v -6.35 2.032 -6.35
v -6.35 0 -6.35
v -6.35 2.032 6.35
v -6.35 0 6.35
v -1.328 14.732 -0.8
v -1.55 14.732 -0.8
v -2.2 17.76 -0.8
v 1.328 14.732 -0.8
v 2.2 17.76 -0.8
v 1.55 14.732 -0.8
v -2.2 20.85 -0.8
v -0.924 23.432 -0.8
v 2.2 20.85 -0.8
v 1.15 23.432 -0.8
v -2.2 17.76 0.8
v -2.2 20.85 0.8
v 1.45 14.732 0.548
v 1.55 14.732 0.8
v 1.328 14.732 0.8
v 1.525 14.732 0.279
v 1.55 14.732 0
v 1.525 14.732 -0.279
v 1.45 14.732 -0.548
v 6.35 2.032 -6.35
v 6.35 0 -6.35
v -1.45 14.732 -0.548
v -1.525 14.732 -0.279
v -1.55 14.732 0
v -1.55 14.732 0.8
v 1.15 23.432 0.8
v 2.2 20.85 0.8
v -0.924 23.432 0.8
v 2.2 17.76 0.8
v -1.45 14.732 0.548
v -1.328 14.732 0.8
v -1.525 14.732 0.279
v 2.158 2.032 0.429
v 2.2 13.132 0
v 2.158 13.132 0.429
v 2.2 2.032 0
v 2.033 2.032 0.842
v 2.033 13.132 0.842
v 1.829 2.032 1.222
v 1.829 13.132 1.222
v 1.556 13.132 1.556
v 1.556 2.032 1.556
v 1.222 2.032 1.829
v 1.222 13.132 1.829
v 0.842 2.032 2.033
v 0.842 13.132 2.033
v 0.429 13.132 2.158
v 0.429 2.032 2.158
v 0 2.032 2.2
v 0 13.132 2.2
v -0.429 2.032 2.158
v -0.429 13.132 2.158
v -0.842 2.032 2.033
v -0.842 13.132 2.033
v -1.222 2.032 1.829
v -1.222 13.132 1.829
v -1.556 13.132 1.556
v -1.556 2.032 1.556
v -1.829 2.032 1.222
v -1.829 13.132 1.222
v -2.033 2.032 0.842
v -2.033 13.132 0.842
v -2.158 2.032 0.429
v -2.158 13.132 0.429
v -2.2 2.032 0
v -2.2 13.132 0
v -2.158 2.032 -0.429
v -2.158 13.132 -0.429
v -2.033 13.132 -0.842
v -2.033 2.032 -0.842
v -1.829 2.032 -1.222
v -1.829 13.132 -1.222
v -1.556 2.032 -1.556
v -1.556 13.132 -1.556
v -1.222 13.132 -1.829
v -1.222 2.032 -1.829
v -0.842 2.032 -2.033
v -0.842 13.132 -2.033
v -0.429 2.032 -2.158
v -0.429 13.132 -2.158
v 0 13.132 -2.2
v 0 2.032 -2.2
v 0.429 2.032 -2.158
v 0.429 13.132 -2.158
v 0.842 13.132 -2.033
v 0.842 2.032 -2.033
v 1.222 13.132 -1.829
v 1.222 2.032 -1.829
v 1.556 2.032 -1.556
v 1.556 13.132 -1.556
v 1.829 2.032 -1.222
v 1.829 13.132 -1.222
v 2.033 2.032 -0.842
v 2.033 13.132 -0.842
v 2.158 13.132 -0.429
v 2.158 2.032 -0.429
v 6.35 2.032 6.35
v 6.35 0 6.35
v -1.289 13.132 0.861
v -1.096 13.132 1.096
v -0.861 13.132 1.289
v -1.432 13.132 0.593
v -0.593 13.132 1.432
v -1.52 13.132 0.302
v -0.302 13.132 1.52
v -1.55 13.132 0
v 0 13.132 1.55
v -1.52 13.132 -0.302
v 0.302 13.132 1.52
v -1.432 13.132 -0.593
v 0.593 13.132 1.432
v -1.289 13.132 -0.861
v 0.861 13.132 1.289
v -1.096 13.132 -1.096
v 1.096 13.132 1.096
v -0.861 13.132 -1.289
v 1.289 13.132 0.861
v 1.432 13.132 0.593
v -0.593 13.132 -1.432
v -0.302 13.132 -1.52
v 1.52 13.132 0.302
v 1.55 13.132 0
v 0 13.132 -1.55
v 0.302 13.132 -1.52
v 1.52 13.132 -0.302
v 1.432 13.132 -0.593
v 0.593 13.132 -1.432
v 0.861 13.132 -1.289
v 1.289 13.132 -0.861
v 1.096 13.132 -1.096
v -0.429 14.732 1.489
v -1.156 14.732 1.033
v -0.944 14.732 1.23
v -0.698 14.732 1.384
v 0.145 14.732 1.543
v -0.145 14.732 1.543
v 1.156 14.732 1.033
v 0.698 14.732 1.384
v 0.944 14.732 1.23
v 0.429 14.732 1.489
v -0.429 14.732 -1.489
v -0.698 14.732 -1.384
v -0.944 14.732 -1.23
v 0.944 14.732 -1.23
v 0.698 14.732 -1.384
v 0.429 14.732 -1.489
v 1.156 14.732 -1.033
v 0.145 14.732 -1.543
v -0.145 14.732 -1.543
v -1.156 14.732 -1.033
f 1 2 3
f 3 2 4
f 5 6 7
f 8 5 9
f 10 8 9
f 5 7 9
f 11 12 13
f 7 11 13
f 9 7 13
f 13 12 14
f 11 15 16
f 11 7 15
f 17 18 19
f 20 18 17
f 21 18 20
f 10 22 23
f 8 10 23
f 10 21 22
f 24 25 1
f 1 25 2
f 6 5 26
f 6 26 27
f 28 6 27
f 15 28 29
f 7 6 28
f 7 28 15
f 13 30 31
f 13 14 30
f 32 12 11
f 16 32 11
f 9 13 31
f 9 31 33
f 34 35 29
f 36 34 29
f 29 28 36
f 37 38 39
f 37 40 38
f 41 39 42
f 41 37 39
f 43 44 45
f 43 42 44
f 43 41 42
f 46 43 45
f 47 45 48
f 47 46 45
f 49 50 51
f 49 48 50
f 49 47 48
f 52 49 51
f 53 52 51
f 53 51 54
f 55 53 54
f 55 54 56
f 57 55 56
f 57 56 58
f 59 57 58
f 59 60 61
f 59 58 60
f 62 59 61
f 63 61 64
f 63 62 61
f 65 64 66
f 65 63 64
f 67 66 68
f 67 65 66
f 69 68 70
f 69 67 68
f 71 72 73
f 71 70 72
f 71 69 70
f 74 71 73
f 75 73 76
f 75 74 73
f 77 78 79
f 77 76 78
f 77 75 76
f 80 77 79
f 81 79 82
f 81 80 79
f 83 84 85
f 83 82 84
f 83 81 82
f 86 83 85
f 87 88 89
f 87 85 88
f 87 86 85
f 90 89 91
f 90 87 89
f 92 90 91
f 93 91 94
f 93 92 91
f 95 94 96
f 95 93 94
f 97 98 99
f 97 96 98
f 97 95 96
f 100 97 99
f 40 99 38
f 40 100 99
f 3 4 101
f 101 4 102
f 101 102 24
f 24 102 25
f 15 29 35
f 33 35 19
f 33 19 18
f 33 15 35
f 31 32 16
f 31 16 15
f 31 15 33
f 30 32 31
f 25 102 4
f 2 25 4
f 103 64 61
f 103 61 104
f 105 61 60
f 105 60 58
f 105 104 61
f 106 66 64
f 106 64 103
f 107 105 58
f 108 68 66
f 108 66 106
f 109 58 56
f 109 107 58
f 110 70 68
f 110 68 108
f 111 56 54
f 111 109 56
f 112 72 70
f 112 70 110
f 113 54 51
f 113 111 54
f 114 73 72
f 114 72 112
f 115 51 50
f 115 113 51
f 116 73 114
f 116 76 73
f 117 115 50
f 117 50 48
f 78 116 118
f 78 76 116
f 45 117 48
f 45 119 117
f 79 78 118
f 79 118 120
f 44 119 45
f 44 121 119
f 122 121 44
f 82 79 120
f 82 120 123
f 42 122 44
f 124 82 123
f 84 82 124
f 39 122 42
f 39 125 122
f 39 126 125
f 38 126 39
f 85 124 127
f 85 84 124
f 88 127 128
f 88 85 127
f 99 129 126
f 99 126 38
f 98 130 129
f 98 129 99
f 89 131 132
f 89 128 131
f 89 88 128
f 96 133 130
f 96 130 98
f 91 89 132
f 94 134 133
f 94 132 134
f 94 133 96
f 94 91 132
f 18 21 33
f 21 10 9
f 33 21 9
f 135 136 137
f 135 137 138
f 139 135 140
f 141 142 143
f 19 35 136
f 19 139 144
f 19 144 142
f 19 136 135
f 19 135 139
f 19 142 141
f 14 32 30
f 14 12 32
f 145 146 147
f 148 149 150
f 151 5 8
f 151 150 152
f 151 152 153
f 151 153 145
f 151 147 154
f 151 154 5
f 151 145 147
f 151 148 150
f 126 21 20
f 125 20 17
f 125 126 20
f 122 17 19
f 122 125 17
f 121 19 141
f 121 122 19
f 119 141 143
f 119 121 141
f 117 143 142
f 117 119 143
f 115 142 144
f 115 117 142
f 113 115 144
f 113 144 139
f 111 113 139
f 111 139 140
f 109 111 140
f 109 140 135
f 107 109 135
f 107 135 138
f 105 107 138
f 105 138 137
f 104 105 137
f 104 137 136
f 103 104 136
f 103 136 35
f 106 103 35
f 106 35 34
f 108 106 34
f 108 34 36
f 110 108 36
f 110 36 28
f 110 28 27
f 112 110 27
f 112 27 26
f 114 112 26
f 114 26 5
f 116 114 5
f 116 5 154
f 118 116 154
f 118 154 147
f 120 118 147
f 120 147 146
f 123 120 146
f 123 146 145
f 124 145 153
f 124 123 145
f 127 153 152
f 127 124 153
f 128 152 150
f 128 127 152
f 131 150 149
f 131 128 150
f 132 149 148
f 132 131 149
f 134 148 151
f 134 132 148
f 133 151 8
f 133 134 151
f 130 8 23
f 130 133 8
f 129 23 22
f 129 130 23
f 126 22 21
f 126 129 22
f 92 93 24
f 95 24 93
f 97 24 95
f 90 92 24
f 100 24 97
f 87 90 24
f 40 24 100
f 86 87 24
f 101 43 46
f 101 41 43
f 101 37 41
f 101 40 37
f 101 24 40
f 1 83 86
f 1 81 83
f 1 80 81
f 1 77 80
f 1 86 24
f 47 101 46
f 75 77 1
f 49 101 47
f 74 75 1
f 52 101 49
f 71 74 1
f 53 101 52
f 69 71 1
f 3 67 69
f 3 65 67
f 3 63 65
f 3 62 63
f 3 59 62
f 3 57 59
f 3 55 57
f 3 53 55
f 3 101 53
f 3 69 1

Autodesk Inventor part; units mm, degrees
ref_plane "YZ Plane" through (0, 0, 0) normal (1, 0, 0) x (0, 1, 0)
ref_plane "XZ Plane" through (0, 0, 0) normal (0, 1, 0) x (-1, 0, 0)
ref_plane "XY Plane" through (0, 0, 0) normal (0, 0, 1) x (1, 0, 0)
sketch "Sketch1" plane through (0, 0, 0) normal (0, 1, 0) x (-1, 0, 0)
  line L0 (6.35, 6.35) -> (-6.35, 6.35)
  line L1 (-6.35, 6.35) -> (-6.35, -6.35)
  line L2 (-6.35, -6.35) -> (6.35, -6.35)
  line L3 (6.35, -6.35) -> (6.35, 6.35)
  point P0 (0, 0)
  dimension "d0" = 12.7
  dimension "d1" = 12.7
  dimension "d2" = 6.35
  dimension "d3" = 6.35
extrude "Extrusion1" add sketch "Sketch1" along normal blind 2.032
sketch "Sketch2" plane through (0, 2.032, 0) normal (0, 1, 0) x (1, 0, 0)
  circle A0 centre (0, 0) radius 2.2
  dimension "d6" = 4.4
extrude "Extrusion2" add sketch "Sketch2" along normal blind 11.1
sketch "Sketch3" plane through (0, 13.132, 0) normal (0, 1, 0) x (1, 0, 0)
  circle A0 centre (0, 0) radius 1.55
  dimension "d9" = 3.1
extrude "Extrusion3" add sketch "Sketch3" along normal blind 1.6
sketch "Sketch4" plane through (0, 0, 0) normal (0, 0, 1) x (1, 0, 0)
  line L0 (-2.2, 23.432) -> (2.2, 23.432)
  line L1 (2.2, 23.432) -> (2.2, 14.732)
  line L2 (2.2, 14.732) -> (-2.2, 14.732)
  line L3 (-2.2, 14.732) -> (-2.2, 23.432)
  line L4 (-6.35, 0) -> (6.35, 0) projected
  line L5 (0, 0) -> (0, -2.1556)
  line L6 (1.55, 14.732) -> (2.2, 17.7603)
  line L7 (1.55, 14.732) -> (-1.55, 14.732) projected
  line L8 (-1.55, 14.732) -> (-2.2, 17.7603)
  line L9 (-0.9244, 23.432) -> (-2.2, 20.8496)
  line L10 (1.1495, 23.432) -> (2.2, 20.8496)
  dimension "d12" = 14.732
  dimension "d13" = 8.7
  dimension "d14" = 4.4
  dimension "d15" = 2.2
extrude "Extrusion4" add sketch "Sketch4" along normal mid plane 1.6 contours L0 L10 L1 L6 L2 L8 L3 L9
properties part number "11mm_Board_Support"
